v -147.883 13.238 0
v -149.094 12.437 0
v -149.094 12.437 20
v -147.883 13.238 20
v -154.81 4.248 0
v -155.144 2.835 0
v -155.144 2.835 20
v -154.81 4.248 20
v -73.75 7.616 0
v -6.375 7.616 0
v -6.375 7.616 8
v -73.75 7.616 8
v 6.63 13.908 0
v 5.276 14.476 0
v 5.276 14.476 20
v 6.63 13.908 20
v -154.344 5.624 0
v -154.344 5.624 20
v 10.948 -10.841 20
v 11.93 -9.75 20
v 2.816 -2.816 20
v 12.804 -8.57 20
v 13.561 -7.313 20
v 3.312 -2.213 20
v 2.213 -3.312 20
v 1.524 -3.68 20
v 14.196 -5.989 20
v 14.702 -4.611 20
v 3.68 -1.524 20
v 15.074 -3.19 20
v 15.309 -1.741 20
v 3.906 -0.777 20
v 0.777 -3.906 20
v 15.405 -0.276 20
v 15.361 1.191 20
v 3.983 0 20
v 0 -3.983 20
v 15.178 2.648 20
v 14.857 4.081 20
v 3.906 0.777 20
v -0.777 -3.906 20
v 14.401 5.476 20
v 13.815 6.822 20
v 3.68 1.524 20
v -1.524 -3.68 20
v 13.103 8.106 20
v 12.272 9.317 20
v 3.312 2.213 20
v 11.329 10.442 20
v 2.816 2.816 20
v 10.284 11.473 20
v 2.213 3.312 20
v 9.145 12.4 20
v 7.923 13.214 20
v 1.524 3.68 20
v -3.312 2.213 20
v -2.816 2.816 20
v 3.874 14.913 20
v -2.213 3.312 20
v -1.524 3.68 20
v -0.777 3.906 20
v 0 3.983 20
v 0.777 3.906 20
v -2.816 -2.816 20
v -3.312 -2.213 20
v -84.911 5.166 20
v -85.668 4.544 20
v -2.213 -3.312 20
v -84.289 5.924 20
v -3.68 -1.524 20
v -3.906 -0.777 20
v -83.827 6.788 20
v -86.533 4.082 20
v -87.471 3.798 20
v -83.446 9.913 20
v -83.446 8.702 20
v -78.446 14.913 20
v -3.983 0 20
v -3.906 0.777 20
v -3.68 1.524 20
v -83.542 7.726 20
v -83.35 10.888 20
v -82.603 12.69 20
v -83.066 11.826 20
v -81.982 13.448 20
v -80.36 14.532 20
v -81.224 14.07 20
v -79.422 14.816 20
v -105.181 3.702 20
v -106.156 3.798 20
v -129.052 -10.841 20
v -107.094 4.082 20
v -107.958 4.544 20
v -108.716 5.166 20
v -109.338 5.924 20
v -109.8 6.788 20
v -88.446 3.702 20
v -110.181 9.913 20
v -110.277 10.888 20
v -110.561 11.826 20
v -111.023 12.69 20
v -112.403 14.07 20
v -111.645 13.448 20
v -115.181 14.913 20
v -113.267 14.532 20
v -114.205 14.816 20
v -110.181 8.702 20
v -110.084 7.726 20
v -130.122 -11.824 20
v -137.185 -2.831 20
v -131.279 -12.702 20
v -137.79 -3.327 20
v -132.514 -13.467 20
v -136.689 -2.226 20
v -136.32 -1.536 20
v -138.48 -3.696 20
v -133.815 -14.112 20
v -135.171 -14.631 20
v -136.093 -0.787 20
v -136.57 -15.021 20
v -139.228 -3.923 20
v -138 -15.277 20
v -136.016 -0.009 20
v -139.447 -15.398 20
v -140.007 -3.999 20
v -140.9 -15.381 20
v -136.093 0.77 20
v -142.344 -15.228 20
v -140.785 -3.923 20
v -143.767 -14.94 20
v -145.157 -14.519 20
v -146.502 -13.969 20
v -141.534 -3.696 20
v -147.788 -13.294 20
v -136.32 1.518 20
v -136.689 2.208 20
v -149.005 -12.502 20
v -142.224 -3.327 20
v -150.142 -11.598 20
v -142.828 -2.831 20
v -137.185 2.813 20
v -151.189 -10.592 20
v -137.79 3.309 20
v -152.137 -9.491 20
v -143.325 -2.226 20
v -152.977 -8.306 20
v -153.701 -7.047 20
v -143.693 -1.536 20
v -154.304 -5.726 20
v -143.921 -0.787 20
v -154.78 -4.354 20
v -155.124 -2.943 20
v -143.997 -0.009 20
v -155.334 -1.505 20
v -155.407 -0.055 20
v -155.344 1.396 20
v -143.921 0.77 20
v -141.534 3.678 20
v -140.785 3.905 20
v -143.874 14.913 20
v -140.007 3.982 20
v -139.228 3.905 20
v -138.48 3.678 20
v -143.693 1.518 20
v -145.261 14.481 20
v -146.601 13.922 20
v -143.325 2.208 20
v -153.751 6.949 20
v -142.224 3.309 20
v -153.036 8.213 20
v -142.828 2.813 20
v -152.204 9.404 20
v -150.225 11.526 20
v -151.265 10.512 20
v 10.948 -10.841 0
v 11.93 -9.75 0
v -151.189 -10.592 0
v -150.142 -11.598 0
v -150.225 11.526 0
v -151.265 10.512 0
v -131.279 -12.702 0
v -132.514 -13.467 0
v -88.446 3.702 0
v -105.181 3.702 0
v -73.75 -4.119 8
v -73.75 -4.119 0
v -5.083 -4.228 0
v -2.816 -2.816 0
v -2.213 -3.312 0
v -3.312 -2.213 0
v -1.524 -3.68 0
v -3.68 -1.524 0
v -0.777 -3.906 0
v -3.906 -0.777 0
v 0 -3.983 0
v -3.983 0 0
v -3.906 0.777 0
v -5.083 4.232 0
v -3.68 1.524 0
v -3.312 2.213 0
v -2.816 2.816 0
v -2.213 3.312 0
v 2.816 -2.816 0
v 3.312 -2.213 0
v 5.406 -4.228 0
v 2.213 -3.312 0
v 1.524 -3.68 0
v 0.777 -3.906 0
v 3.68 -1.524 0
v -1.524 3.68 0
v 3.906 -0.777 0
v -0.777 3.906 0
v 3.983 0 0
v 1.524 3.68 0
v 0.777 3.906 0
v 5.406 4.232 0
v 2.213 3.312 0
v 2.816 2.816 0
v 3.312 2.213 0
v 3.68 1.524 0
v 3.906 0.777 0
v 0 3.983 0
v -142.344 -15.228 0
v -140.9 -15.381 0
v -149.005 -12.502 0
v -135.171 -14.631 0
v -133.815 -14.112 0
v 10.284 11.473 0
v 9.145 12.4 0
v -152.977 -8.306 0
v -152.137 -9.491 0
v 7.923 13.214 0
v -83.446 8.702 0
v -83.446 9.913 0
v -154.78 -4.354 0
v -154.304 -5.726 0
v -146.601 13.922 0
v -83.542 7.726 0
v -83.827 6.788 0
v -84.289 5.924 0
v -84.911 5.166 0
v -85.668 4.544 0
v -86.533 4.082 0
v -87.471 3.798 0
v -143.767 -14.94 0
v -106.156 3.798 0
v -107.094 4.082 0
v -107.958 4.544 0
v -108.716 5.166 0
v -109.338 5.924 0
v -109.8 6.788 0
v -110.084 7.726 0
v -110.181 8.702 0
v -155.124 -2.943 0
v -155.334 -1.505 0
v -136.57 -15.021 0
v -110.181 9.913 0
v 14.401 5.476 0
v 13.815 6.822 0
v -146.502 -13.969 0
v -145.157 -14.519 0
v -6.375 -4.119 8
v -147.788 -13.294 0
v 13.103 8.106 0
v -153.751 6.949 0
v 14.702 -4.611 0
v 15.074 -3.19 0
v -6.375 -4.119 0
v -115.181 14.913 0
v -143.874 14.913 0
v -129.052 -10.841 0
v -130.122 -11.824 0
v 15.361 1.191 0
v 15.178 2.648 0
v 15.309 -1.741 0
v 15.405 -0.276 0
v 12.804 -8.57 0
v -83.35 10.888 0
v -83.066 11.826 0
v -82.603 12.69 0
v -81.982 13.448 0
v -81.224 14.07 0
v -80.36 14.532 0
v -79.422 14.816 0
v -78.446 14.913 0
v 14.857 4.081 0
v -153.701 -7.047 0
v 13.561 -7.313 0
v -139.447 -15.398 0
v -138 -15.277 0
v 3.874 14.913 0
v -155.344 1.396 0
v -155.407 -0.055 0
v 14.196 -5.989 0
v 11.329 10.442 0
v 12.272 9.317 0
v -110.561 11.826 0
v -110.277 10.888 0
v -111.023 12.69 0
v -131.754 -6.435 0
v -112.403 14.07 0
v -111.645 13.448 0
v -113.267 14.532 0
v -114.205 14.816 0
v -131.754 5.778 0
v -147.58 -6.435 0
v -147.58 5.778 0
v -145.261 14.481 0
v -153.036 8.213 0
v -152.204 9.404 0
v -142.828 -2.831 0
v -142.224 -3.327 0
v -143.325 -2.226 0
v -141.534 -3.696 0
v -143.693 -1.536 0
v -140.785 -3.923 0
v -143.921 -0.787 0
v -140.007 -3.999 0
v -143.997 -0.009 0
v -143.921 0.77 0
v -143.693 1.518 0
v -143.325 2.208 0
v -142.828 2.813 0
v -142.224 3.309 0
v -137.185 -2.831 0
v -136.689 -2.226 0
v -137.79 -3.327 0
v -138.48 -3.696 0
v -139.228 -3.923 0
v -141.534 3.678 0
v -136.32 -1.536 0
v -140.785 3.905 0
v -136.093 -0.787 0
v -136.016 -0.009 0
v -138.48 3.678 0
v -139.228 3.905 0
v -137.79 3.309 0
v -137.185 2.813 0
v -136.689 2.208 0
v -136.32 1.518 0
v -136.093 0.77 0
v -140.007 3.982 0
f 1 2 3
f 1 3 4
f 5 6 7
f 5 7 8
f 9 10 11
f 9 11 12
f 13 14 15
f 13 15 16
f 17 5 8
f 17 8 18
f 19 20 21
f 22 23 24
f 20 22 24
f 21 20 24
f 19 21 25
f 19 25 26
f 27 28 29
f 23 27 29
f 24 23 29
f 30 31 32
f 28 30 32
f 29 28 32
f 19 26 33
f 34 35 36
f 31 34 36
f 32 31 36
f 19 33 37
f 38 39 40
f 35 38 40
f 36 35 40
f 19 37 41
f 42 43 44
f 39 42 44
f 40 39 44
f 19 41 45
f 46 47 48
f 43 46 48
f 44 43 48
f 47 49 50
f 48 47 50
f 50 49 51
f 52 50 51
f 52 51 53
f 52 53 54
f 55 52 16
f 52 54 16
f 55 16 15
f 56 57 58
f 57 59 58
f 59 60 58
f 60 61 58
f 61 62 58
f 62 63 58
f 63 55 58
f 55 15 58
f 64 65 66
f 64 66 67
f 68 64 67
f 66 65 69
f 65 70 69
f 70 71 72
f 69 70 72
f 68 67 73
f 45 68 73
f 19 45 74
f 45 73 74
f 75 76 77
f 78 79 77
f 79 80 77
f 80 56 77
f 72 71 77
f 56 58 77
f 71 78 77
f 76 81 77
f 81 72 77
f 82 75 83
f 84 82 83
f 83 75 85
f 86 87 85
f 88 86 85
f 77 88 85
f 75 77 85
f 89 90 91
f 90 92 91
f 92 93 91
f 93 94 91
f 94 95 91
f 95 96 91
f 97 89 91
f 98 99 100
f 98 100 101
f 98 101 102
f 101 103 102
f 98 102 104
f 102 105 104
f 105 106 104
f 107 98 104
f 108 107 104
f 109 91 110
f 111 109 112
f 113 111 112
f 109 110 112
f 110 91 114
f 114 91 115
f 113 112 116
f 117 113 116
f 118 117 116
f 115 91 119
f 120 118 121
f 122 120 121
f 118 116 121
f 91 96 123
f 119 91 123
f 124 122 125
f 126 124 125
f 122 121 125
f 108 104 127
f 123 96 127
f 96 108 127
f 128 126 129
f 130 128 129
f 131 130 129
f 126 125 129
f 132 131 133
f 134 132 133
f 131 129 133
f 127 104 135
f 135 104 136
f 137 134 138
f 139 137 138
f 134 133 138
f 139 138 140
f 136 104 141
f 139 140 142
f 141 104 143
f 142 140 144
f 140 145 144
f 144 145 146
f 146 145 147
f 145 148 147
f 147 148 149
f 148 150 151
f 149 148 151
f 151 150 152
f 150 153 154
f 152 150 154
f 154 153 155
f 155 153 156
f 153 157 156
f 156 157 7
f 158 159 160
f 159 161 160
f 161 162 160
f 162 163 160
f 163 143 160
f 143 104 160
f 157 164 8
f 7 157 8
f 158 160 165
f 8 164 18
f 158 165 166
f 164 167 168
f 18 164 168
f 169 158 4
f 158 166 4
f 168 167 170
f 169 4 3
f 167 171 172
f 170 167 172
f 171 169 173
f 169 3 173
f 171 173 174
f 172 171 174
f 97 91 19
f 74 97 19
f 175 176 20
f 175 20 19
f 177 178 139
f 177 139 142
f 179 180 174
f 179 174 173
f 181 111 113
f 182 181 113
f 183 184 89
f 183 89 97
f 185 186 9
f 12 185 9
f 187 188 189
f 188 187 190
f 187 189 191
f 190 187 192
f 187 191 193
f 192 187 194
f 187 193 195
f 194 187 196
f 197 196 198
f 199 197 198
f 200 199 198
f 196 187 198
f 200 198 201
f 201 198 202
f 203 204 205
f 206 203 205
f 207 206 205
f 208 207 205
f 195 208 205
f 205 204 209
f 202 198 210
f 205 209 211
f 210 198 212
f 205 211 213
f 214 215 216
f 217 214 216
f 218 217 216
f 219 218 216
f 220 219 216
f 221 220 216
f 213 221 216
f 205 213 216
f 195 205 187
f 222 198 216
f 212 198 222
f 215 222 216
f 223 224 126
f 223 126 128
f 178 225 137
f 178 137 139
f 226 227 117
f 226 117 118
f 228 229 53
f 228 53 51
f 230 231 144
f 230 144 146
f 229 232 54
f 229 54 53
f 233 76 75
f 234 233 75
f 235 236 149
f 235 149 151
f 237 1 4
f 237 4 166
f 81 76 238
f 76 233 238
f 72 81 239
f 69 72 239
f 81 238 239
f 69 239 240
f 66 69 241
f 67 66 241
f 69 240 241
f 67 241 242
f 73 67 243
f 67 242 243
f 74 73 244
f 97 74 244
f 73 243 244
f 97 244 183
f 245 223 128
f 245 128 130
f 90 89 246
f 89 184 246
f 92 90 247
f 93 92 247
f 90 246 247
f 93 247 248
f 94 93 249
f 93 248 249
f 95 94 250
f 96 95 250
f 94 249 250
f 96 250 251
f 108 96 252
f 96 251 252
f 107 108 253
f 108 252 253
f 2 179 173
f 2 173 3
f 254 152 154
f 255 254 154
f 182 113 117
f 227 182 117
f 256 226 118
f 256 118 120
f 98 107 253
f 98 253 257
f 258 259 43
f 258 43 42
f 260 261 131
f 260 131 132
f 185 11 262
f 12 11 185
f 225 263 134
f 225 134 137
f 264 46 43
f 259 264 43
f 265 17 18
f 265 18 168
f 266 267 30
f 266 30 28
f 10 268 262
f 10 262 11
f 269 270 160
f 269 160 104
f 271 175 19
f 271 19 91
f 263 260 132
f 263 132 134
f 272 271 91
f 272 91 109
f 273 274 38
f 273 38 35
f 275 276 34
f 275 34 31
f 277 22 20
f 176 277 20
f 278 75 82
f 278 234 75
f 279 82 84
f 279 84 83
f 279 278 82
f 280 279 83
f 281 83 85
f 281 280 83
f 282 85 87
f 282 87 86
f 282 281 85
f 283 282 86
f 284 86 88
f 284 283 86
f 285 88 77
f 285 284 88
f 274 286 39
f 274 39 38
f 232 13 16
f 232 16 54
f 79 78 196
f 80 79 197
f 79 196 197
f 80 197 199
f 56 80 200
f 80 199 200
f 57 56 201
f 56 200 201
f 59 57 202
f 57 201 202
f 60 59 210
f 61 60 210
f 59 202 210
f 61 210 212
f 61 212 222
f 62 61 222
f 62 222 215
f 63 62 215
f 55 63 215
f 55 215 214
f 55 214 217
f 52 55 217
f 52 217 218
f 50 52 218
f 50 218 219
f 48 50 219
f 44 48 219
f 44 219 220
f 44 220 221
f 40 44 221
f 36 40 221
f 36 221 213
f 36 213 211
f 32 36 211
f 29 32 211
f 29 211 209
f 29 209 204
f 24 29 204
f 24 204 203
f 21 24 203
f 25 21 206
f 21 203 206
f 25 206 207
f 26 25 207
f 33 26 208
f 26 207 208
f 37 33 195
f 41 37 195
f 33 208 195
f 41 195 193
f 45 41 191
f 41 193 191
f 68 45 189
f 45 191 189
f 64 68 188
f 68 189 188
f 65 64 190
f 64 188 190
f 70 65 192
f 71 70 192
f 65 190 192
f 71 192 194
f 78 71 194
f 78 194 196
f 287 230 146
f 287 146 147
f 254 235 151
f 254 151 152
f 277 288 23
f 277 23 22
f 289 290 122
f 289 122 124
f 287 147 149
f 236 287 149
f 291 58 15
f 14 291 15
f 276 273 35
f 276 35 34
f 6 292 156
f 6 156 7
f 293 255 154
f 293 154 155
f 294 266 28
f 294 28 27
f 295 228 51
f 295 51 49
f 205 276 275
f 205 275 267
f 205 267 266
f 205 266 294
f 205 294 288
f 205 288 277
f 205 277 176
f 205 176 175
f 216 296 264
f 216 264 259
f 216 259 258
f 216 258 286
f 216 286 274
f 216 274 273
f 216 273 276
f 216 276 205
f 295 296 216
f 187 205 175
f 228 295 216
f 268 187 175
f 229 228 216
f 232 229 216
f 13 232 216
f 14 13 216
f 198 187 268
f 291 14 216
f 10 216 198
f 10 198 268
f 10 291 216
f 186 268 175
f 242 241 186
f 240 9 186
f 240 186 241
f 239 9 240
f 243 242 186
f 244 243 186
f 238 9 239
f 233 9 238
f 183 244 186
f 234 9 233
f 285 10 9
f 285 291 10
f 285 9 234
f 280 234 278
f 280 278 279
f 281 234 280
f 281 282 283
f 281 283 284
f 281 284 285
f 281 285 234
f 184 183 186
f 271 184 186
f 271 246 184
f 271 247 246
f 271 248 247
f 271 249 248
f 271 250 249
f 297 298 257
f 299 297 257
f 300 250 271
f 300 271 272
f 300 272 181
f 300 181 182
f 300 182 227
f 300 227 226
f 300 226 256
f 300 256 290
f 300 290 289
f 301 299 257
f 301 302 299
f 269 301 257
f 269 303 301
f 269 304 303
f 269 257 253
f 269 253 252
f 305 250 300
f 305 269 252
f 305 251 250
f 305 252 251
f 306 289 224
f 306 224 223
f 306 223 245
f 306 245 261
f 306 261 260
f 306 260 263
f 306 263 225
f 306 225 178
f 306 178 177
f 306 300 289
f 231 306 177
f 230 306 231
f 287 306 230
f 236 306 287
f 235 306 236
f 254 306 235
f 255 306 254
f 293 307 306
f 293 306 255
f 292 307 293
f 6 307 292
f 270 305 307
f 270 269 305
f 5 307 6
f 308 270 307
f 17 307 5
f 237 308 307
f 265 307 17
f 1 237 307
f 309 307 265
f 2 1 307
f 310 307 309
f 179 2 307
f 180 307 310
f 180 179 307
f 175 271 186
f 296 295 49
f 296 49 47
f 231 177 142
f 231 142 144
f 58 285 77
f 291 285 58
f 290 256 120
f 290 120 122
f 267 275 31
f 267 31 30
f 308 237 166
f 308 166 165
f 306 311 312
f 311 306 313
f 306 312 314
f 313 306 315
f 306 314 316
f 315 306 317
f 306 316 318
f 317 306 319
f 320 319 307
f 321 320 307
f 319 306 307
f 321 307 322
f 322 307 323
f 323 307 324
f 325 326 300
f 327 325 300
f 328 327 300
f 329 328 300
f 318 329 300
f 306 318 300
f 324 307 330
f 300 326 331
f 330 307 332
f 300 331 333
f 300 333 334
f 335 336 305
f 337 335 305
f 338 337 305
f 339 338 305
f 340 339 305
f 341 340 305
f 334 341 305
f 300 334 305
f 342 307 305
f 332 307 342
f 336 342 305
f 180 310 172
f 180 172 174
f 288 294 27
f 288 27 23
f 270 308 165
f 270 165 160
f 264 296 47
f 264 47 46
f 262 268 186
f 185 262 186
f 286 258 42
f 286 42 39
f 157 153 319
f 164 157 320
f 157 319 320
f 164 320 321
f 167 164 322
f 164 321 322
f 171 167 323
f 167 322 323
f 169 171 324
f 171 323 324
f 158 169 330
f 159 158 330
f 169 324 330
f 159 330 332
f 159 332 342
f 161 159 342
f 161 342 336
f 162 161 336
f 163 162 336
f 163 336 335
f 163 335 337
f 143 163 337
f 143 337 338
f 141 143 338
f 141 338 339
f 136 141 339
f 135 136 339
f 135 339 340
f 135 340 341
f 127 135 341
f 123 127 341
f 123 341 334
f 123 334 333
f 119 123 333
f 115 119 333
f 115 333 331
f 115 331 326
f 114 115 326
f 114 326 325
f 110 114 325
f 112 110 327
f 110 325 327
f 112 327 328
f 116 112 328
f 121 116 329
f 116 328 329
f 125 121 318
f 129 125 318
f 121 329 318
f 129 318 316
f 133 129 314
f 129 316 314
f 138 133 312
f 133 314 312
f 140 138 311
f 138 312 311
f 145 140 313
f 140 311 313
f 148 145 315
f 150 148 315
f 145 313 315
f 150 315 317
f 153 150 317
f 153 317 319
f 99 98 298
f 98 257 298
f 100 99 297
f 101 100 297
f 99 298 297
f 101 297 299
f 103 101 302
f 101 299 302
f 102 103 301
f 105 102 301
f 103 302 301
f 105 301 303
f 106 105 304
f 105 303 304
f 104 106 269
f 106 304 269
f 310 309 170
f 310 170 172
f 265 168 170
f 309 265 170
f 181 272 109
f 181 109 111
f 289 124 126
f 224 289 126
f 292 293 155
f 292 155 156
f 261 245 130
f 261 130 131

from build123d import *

# Parameters (mm, degrees)
BOSS_EXTRUDE1_DEPTH = 19.999999553
CUT_EXTRUDE1_DEPTH  = 158.443784597
CUT_EXTRUDE2_DEPTH  = 158.443784597
SKETCH7_W           = 15.825305434
SKETCH7_H           = 12.213007454
SKETCH7_W_2         = 10.489088449
SKETCH7_H_2         = 8.460664219
BOSS_EXTRUDE5_DEPTH = 20
SKETCH6_R           = 3.982936417
SKETCH6_R_2         = 3.990480896
CUT_EXTRUDE8_DEPTH  = 40
SKETCH8_W           = 26.734403149
SKETCH8_H           = 11.210794898
CUT_EXTRUDE9_DEPTH  = 30
FILLET1_R           = 5
FILLET2_R           = 5
SKETCH9_W           = 67.375066669
SKETCH9_H           = 11.734562751
CUT_EXTRUDE10_DEPTH = 8


with BuildPart() as part:
    # Sketch1 → Boss-Extrude1 (new body)
    with BuildSketch(Plane(origin=(0, 0, 0), x_dir=(-1, 0, 0), z_dir=(0, 0, -1))):
        Polygon((150.224894285, 11.525735259), (149.094194174, 12.437307276), (147.882685065, 13.238362968), (146.601140499, 13.921783306), (145.260930061, 14.481496066), (143.87395978, 14.912526123), (-3.873967333, 14.912526123), (-5.275767762, 14.476095326), (-6.629663985, 13.908221386), (-7.923361845, 13.214060105), (-9.145116434, 12.399914674), (-10.28383337, 11.473178864), (-11.329172179, 10.442265309), (-12.271642685, 9.316536598), (-13.102686033, 8.106213063), (-13.814756647, 6.822284777), (-14.401388355, 5.476410501), (-14.857255854, 4.080810118), (-15.178218484, 2.648155671), (-15.361363068, 1.191455987), (-15.405026264, -0.276062055), (-15.308812261, -1.741073444), (-15.073592775, -3.19027598), (-14.70150426, -4.610510543), (-14.195927419, -5.988881458), (-13.561449945, -7.312873378), (-12.803834863, -8.570464328), (-11.929960921, -9.750235826), (-10.947762057, -10.841473937), (129.052236676, -10.841473937), (130.121722817, -11.824152432), (131.278976798, -12.701761909), (132.513716817, -13.466504402), (133.815005422, -14.111584984), (135.171234608, -14.631270431), (136.570379138, -15.020942315), (137.999981642, -15.277140774), (139.447391033, -15.39758686), (140.899673104, -15.381210484), (142.343983054, -15.228157863), (143.767461181, -14.939788729), (145.157456398, -14.518666081), (146.501630545, -13.968531042), (147.788017988, -13.294272125), (149.00521934, -12.501881458), (150.142401457, -11.59839984), (151.189431548, -10.591856204), (152.137070894, -9.49119404), (152.976840734, -8.306192234), (153.701290488, -7.047383115), (154.303997755, -5.725951865), (154.779613018, -4.353639204), (155.123889446, -2.9426408), (155.333772302, -1.505494351), (155.407398939, -0.054970031), (155.344113708, 1.39604276), (155.144497752, 2.834650222), (154.81030941, 4.248069134), (154.344499111, 5.623740144), (153.751239181, 6.949439179), (153.035759926, 8.21338594), (152.204483747, 9.40434821), (151.264742017, 10.511744767), align=None)
    extrude(amount=-BOSS_EXTRUDE1_DEPTH)

    # Sketch2 → Cut-Extrude1 (cut, through all)
    with BuildSketch(Plane.XY.offset(19.999999553)):
        Polygon((3.729888937, 1.444966649), (3.400868736, 2.105728723), (2.956035547, 2.694782568), (2.410538495, 3.192068776), (1.78295339, 3.580653109), (1.094651991, 3.847302636), (0.369073445, 3.982936498), (-0.369073445, 3.982936498), (-1.094651991, 3.847302636), (-1.78295339, 3.580653109), (-2.410538495, 3.192068776), (-2.956035547, 2.694782568), (-3.400868736, 2.105728723), (-3.729888937, 1.444966649), (-3.93189257, 0.73499803), (-4.00000019, 0), (-3.93189257, -0.73499803), (-3.729888937, -1.444966649), (-3.400868736, -2.105728723), (-2.956035547, -2.694782568), (-2.410538495, -3.192068776), (-1.78295339, -3.580653109), (-1.094651991, -3.847302636), (-0.369073445, -3.982936498), (0.369073445, -3.982936498), (1.094651991, -3.847302636), (1.78295339, -3.580653109), (2.410538495, -3.192068776), (2.956035547, -2.694782568), (3.400868736, -2.105728723), (3.729888937, -1.444966649), (3.93189257, -0.73499803), (4.00000019, 0), (3.93189257, 0.73499803), align=None)
    extrude(amount=-CUT_EXTRUDE1_DEPTH, mode=Mode.SUBTRACT)

    # Sketch3 → Cut-Extrude2 (cut, through all)
    with BuildSketch(Plane.XY.offset(19.999999553)):
        Polygon((-139.630913734, 3.982936498), (-140.369072556, 3.982936498), (-141.094654799, 3.847302636), (-141.782954335, 3.580653109), (-142.41053164, 3.192068776), (-142.956033349, 2.694782568), (-143.400862813, 2.105728723), (-143.729895353, 1.444966649), (-143.931895494, 0.73499803), (-143.999993801, 0), (-143.931895494, -0.73499803), (-143.729895353, -1.444966649), (-143.400862813, -2.105728723), (-142.956033349, -2.694782568), (-142.41053164, -3.192068776), (-141.782954335, -3.580653109), (-141.094654799, -3.847302636), (-140.369072556, -3.982936498), (-139.630913734, -3.982936498), (-138.905346394, -3.847302636), (-138.217046857, -3.580653109), (-137.589469552, -3.192068776), (-137.043967843, -2.694782568), (-136.599138379, -2.105728723), (-136.270105839, -1.444966649), (-136.068105698, -0.73499803), (-136.000007391, 0), (-136.068105698, 0.73499803), (-136.270105839, 1.444966649), (-136.599138379, 2.105728723), (-137.043967843, 2.694782568), (-137.589469552, 3.192068776), (-138.217046857, 3.580653109), (-138.905346394, 3.847302636), align=None)
    extrude(amount=-CUT_EXTRUDE2_DEPTH, mode=Mode.SUBTRACT)

    # Sketch7 → Boss-Extrude5 (add)
    with BuildSketch(Plane.XY.offset(19.999999553)):
        with Locations((-139.666933083, -0.328537463)):
            Rectangle(SKETCH7_W, SKETCH7_H)
        with Locations((0.16180396, 0.00184402)):
            Rectangle(SKETCH7_W_2, SKETCH7_H_2)
    extrude(amount=-BOSS_EXTRUDE5_DEPTH)

    # Sketch6 → Cut-Extrude8 (cut)
    with BuildSketch(Plane(origin=(0, 0, -10), x_dir=(-1, 0, 0), z_dir=(0, 0, -1))):
        with Locations((4.82e-07, 8.1e-08)):
            Circle(SKETCH6_R)
        with Locations((140.006757016, -0.008937853)):
            Circle(SKETCH6_R_2)
    extrude(amount=-CUT_EXTRUDE8_DEPTH, mode=Mode.SUBTRACT)

    # Sketch8 → Cut-Extrude9 (cut)
    with BuildSketch(Plane.XY.offset(19.999999553)):
        with Locations((-96.813347326, 9.307128674)):
            Rectangle(SKETCH8_W, SKETCH8_H)
    extrude(amount=-CUT_EXTRUDE9_DEPTH, mode=Mode.SUBTRACT)

    # Fillet1
    fillet1_edges = [part.edges().sort_by_distance(p)[0] for p in [
        (-83.446145751, 3.701731225, 9.999999776),
        (-110.1805489, 3.701731225, 9.999999776),
    ]]
    fillet(fillet1_edges, radius=FILLET1_R)

    # Fillet2
    fillet2_edges = [part.edges().sort_by_distance(p)[0] for p in [
        (-83.446145751, 14.912526123, 9.999999776),
        (-110.1805489, 14.912526123, 9.999999776),
    ]]
    fillet(fillet2_edges, radius=FILLET2_R)

    # Sketch9 → Cut-Extrude10 (cut)
    with BuildSketch(Plane(origin=(0, 2.549240283, 0), x_dir=(-1, 0, 0), z_dir=(0, 0, -1))):
        with Locations((40.062197326, -0.800943257)):
            Rectangle(SKETCH9_W, SKETCH9_H)
    extrude(amount=-CUT_EXTRUDE10_DEPTH, mode=Mode.SUBTRACT)


solid = part.part
